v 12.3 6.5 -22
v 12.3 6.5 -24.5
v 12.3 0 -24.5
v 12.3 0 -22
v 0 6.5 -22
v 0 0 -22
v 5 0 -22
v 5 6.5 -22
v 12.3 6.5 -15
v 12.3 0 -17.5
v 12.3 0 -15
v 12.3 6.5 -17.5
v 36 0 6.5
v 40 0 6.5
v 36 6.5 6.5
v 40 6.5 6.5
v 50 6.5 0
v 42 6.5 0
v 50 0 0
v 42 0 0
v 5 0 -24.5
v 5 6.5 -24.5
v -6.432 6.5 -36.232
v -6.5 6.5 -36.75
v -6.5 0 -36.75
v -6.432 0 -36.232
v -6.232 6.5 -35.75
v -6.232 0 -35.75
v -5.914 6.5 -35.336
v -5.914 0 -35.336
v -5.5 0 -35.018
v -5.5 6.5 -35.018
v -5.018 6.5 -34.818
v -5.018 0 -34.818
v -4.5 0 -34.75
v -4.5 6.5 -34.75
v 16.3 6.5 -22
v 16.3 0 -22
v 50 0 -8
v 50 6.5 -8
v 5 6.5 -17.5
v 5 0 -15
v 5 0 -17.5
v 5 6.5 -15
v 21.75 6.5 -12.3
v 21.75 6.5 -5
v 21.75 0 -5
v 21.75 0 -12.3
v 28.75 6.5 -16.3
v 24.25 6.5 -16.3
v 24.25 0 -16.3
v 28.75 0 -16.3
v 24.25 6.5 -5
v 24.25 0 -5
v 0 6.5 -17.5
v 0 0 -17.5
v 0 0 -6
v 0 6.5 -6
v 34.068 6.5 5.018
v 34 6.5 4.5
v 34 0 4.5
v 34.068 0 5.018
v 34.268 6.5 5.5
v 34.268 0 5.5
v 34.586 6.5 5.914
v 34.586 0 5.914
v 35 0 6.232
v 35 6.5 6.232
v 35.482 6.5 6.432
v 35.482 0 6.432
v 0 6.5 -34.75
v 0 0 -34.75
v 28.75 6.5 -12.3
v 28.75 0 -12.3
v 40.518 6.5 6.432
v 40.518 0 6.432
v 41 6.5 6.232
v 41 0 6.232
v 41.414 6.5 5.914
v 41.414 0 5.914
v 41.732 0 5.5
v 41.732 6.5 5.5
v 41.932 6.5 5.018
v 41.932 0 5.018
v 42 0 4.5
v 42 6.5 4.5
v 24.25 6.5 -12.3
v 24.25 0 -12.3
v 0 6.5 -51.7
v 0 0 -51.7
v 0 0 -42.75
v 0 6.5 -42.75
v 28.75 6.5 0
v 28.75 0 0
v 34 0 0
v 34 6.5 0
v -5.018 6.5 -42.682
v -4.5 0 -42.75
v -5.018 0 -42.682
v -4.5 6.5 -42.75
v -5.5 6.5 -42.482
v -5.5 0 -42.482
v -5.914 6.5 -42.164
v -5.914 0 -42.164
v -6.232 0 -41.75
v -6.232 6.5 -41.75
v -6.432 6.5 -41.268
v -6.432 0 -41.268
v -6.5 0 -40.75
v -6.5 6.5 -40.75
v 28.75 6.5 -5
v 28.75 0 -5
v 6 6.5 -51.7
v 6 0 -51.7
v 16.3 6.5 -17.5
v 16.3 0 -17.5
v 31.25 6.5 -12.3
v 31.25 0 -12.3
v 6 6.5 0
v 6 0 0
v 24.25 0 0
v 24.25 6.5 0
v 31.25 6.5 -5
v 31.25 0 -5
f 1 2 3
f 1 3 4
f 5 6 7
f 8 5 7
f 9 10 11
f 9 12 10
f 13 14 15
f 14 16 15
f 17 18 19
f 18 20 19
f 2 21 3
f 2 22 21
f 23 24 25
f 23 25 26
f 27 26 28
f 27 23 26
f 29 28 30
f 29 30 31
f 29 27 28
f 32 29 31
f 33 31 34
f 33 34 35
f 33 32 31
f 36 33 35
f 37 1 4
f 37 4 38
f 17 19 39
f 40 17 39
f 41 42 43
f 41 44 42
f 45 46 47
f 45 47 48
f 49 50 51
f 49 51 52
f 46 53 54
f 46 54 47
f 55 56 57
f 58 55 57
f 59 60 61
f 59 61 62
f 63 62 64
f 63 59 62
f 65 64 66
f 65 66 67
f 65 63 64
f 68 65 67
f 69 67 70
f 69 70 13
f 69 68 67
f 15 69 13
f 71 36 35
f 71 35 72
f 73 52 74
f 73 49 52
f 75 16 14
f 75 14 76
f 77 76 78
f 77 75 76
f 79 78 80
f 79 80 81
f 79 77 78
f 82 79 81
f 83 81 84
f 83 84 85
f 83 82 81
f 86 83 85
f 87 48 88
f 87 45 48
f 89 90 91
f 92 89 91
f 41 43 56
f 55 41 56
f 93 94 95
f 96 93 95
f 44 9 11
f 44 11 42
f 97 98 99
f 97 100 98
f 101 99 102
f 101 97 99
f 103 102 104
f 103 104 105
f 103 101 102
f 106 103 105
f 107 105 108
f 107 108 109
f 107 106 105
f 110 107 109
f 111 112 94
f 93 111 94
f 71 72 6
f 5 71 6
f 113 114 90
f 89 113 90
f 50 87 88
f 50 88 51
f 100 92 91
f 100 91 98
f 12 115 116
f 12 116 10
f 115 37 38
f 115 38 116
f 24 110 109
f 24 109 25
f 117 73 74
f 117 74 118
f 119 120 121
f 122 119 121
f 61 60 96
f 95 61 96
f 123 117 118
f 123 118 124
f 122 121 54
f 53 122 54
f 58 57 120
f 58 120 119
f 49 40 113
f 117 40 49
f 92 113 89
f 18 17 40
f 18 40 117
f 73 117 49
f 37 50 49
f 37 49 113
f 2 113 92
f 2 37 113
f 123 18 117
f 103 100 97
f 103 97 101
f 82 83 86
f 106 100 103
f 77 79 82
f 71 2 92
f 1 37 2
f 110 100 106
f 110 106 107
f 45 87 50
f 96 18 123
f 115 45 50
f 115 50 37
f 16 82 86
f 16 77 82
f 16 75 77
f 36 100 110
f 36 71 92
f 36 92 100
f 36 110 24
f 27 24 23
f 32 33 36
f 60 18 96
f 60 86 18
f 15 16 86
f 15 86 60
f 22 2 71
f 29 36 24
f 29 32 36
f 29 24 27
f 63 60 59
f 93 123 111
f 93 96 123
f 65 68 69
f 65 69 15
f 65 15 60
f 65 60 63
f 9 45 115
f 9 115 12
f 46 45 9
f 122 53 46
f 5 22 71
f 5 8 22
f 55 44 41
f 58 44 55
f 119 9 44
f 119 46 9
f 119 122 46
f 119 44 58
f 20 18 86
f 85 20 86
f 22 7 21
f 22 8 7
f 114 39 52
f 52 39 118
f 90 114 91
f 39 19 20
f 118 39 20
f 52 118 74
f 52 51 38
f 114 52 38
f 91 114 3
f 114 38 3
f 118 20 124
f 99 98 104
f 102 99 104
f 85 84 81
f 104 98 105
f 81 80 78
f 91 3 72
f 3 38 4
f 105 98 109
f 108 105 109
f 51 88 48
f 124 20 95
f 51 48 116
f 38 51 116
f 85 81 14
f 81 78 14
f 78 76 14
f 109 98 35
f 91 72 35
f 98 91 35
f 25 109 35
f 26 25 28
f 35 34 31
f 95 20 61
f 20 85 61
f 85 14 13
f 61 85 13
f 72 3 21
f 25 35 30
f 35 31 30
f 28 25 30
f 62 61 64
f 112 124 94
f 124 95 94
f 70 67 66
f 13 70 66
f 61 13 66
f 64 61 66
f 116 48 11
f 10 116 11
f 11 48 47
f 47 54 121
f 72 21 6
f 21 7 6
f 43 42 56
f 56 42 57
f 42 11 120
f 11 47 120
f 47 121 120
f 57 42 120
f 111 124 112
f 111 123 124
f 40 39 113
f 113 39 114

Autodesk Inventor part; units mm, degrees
ref_plane "YZ Plane" through (0, 0, 0) normal (1, 0, 0) x (0, 1, 0)
ref_plane "XZ Plane" through (0, 0, 0) normal (0, 1, 0) x (-1, 0, 0)
ref_plane "XY Plane" through (0, 0, 0) normal (0, 0, 1) x (1, 0, 0)
sketch "Sketch1" plane through (0, 0, 0) normal (0, 1, 0) x (-1, 0, 0)
  line L0 (0, -51.7) -> (0, 0)
  line L1 (0, 0) -> (-50, 0)
  line L2 (-50, 0) -> (-50, -8)
  line L3 (-50, -8) -> (-6, -51.7)
  line L4 (-6, -51.7) -> (0, -51.7)
  dimension "d0" = 51.7
  dimension "d1" = 50
  dimension "d2" = 8
  dimension "d3" = 6
extrude "Extrusion1" add sketch "Sketch1" along normal blind 6.5
sketch "Sketch2" plane through (0, 6.5, 0) normal (0, 1, 0) x (1, 0, 0)
  line L0 (0, 0) -> (50, 0) projected
  line L1 (50, 0) -> (50, 8) projected
  line L2 (34, 0) -> (42, 0)
  line L3 (42, 0) -> (42, -4.5)
  line L4 (40, -6.5) -> (36, -6.5)
  line L5 (34, -4.5) -> (34, 0)
  arc A0 (34, -4.5) -> (36, -6.5) centre (36, -4.5) ccw
  arc A1 (40, -6.5) -> (42, -4.5) centre (40, -4.5) ccw
  dimension "d6" = 2
  dimension "d7" = 8
  dimension "d8" = 6.5
  dimension "d9" = 8
extrude "Extrusion2" add sketch "Sketch2" against normal blind 6.5
sketch "Sketch3" plane through (0, 6.5, 0) normal (0, 1, 0) x (1, 0, 0)
  line L0 (0, 0) -> (34, 0) projected
  line L1 (34, 0) -> (34, -4.5) projected
  line L2 (24.25, 16.3) -> (28.75, 16.3)
  line L3 (28.75, 0) -> (24.25, 0)
  line L4 (31.25, 12.3) -> (31.25, 5)
  line L5 (21.75, 5) -> (21.75, 12.3)
  line L6 (21.75, 12.3) -> (24.25, 12.3)
  line L7 (28.75, 12.3) -> (31.25, 12.3)
  line L8 (24.25, 0) -> (24.25, 5)
  line L9 (24.25, 12.3) -> (24.25, 16.3)
  line L10 (31.25, 5) -> (28.75, 5)
  line L11 (24.25, 5) -> (21.75, 5)
  line L12 (28.75, 16.3) -> (28.75, 12.3)
  line L13 (28.75, 5) -> (28.75, 0)
  point P0 (26.5, 16.3)
  dimension "d12" = 4.5
  dimension "d13" = 5
  dimension "d14" = 7.3
  dimension "d15" = 4
  dimension "d16" = 2.5
  dimension "d17" = 7.5
extrude "Extrusion3" cut sketch "Sketch3" against normal through all
sketch "Sketch4" plane through (0, 6.5, 0) normal (0, 1, 0) x (1, 0, 0)
  line L0 (0, 51.7) -> (0, 0) projected
  line L1 (0, 0) -> (24.25, 0) projected
  line L2 (16.3, 22) -> (16.3, 17.5)
  line L3 (0, 17.5) -> (0, 22)
  line L4 (5, 24.5) -> (12.3, 24.5)
  line L5 (12.3, 15) -> (5, 15)
  line L6 (0, 22) -> (5, 22)
  line L7 (12.3, 22) -> (16.3, 22)
  line L8 (16.3, 17.5) -> (12.3, 17.5)
  line L9 (5, 17.5) -> (0, 17.5)
  line L10 (5, 15) -> (5, 17.5)
  line L11 (5, 22) -> (5, 24.5)
  line L12 (12.3, 24.5) -> (12.3, 22)
  line L13 (12.3, 17.5) -> (12.3, 15)
  point P0 (16.3, 19.75)
  dimension "d20" = 4.5
  dimension "d21" = 5
  dimension "d22" = 4
  dimension "d23" = 7.3
  dimension "d24" = 19.75
  dimension "d25" = 2.5
extrude "Extrusion4" cut sketch "Sketch4" against normal through all
sketch "Sketch5" plane through (0, 6.5, 0) normal (0, 1, 0) x (1, 0, 0)
  line L0 (16.3, 22) -> (16.3, 17.5) projected
  line L1 (0, 51.7) -> (0, 22) projected
  line L2 (0, 42.75) -> (-4.5, 42.75)
  line L3 (-6.5, 40.75) -> (-6.5, 36.75)
  line L4 (-4.5, 34.75) -> (0, 34.75)
  line L5 (0, 34.75) -> (0, 42.75)
  arc A0 (-4.5, 42.75) -> (-6.5, 40.75) centre (-4.5, 40.75) ccw
  arc A1 (-6.5, 36.75) -> (-4.5, 34.75) centre (-4.5, 36.75) ccw
  point P0 (16.3, 19.75)
  dimension "d28" = 2
  dimension "d29" = 8
  dimension "d30" = 6.5
  dimension "d31" = 15
extrude "Extrusion5" add sketch "Sketch5" against normal blind 6.5
chamfer "Chamfer1" distance 6 angle 45 1 edges at (0, 3.25, 0)
properties part number "x_carryage_brace_top" material "Plywood, Finish"
